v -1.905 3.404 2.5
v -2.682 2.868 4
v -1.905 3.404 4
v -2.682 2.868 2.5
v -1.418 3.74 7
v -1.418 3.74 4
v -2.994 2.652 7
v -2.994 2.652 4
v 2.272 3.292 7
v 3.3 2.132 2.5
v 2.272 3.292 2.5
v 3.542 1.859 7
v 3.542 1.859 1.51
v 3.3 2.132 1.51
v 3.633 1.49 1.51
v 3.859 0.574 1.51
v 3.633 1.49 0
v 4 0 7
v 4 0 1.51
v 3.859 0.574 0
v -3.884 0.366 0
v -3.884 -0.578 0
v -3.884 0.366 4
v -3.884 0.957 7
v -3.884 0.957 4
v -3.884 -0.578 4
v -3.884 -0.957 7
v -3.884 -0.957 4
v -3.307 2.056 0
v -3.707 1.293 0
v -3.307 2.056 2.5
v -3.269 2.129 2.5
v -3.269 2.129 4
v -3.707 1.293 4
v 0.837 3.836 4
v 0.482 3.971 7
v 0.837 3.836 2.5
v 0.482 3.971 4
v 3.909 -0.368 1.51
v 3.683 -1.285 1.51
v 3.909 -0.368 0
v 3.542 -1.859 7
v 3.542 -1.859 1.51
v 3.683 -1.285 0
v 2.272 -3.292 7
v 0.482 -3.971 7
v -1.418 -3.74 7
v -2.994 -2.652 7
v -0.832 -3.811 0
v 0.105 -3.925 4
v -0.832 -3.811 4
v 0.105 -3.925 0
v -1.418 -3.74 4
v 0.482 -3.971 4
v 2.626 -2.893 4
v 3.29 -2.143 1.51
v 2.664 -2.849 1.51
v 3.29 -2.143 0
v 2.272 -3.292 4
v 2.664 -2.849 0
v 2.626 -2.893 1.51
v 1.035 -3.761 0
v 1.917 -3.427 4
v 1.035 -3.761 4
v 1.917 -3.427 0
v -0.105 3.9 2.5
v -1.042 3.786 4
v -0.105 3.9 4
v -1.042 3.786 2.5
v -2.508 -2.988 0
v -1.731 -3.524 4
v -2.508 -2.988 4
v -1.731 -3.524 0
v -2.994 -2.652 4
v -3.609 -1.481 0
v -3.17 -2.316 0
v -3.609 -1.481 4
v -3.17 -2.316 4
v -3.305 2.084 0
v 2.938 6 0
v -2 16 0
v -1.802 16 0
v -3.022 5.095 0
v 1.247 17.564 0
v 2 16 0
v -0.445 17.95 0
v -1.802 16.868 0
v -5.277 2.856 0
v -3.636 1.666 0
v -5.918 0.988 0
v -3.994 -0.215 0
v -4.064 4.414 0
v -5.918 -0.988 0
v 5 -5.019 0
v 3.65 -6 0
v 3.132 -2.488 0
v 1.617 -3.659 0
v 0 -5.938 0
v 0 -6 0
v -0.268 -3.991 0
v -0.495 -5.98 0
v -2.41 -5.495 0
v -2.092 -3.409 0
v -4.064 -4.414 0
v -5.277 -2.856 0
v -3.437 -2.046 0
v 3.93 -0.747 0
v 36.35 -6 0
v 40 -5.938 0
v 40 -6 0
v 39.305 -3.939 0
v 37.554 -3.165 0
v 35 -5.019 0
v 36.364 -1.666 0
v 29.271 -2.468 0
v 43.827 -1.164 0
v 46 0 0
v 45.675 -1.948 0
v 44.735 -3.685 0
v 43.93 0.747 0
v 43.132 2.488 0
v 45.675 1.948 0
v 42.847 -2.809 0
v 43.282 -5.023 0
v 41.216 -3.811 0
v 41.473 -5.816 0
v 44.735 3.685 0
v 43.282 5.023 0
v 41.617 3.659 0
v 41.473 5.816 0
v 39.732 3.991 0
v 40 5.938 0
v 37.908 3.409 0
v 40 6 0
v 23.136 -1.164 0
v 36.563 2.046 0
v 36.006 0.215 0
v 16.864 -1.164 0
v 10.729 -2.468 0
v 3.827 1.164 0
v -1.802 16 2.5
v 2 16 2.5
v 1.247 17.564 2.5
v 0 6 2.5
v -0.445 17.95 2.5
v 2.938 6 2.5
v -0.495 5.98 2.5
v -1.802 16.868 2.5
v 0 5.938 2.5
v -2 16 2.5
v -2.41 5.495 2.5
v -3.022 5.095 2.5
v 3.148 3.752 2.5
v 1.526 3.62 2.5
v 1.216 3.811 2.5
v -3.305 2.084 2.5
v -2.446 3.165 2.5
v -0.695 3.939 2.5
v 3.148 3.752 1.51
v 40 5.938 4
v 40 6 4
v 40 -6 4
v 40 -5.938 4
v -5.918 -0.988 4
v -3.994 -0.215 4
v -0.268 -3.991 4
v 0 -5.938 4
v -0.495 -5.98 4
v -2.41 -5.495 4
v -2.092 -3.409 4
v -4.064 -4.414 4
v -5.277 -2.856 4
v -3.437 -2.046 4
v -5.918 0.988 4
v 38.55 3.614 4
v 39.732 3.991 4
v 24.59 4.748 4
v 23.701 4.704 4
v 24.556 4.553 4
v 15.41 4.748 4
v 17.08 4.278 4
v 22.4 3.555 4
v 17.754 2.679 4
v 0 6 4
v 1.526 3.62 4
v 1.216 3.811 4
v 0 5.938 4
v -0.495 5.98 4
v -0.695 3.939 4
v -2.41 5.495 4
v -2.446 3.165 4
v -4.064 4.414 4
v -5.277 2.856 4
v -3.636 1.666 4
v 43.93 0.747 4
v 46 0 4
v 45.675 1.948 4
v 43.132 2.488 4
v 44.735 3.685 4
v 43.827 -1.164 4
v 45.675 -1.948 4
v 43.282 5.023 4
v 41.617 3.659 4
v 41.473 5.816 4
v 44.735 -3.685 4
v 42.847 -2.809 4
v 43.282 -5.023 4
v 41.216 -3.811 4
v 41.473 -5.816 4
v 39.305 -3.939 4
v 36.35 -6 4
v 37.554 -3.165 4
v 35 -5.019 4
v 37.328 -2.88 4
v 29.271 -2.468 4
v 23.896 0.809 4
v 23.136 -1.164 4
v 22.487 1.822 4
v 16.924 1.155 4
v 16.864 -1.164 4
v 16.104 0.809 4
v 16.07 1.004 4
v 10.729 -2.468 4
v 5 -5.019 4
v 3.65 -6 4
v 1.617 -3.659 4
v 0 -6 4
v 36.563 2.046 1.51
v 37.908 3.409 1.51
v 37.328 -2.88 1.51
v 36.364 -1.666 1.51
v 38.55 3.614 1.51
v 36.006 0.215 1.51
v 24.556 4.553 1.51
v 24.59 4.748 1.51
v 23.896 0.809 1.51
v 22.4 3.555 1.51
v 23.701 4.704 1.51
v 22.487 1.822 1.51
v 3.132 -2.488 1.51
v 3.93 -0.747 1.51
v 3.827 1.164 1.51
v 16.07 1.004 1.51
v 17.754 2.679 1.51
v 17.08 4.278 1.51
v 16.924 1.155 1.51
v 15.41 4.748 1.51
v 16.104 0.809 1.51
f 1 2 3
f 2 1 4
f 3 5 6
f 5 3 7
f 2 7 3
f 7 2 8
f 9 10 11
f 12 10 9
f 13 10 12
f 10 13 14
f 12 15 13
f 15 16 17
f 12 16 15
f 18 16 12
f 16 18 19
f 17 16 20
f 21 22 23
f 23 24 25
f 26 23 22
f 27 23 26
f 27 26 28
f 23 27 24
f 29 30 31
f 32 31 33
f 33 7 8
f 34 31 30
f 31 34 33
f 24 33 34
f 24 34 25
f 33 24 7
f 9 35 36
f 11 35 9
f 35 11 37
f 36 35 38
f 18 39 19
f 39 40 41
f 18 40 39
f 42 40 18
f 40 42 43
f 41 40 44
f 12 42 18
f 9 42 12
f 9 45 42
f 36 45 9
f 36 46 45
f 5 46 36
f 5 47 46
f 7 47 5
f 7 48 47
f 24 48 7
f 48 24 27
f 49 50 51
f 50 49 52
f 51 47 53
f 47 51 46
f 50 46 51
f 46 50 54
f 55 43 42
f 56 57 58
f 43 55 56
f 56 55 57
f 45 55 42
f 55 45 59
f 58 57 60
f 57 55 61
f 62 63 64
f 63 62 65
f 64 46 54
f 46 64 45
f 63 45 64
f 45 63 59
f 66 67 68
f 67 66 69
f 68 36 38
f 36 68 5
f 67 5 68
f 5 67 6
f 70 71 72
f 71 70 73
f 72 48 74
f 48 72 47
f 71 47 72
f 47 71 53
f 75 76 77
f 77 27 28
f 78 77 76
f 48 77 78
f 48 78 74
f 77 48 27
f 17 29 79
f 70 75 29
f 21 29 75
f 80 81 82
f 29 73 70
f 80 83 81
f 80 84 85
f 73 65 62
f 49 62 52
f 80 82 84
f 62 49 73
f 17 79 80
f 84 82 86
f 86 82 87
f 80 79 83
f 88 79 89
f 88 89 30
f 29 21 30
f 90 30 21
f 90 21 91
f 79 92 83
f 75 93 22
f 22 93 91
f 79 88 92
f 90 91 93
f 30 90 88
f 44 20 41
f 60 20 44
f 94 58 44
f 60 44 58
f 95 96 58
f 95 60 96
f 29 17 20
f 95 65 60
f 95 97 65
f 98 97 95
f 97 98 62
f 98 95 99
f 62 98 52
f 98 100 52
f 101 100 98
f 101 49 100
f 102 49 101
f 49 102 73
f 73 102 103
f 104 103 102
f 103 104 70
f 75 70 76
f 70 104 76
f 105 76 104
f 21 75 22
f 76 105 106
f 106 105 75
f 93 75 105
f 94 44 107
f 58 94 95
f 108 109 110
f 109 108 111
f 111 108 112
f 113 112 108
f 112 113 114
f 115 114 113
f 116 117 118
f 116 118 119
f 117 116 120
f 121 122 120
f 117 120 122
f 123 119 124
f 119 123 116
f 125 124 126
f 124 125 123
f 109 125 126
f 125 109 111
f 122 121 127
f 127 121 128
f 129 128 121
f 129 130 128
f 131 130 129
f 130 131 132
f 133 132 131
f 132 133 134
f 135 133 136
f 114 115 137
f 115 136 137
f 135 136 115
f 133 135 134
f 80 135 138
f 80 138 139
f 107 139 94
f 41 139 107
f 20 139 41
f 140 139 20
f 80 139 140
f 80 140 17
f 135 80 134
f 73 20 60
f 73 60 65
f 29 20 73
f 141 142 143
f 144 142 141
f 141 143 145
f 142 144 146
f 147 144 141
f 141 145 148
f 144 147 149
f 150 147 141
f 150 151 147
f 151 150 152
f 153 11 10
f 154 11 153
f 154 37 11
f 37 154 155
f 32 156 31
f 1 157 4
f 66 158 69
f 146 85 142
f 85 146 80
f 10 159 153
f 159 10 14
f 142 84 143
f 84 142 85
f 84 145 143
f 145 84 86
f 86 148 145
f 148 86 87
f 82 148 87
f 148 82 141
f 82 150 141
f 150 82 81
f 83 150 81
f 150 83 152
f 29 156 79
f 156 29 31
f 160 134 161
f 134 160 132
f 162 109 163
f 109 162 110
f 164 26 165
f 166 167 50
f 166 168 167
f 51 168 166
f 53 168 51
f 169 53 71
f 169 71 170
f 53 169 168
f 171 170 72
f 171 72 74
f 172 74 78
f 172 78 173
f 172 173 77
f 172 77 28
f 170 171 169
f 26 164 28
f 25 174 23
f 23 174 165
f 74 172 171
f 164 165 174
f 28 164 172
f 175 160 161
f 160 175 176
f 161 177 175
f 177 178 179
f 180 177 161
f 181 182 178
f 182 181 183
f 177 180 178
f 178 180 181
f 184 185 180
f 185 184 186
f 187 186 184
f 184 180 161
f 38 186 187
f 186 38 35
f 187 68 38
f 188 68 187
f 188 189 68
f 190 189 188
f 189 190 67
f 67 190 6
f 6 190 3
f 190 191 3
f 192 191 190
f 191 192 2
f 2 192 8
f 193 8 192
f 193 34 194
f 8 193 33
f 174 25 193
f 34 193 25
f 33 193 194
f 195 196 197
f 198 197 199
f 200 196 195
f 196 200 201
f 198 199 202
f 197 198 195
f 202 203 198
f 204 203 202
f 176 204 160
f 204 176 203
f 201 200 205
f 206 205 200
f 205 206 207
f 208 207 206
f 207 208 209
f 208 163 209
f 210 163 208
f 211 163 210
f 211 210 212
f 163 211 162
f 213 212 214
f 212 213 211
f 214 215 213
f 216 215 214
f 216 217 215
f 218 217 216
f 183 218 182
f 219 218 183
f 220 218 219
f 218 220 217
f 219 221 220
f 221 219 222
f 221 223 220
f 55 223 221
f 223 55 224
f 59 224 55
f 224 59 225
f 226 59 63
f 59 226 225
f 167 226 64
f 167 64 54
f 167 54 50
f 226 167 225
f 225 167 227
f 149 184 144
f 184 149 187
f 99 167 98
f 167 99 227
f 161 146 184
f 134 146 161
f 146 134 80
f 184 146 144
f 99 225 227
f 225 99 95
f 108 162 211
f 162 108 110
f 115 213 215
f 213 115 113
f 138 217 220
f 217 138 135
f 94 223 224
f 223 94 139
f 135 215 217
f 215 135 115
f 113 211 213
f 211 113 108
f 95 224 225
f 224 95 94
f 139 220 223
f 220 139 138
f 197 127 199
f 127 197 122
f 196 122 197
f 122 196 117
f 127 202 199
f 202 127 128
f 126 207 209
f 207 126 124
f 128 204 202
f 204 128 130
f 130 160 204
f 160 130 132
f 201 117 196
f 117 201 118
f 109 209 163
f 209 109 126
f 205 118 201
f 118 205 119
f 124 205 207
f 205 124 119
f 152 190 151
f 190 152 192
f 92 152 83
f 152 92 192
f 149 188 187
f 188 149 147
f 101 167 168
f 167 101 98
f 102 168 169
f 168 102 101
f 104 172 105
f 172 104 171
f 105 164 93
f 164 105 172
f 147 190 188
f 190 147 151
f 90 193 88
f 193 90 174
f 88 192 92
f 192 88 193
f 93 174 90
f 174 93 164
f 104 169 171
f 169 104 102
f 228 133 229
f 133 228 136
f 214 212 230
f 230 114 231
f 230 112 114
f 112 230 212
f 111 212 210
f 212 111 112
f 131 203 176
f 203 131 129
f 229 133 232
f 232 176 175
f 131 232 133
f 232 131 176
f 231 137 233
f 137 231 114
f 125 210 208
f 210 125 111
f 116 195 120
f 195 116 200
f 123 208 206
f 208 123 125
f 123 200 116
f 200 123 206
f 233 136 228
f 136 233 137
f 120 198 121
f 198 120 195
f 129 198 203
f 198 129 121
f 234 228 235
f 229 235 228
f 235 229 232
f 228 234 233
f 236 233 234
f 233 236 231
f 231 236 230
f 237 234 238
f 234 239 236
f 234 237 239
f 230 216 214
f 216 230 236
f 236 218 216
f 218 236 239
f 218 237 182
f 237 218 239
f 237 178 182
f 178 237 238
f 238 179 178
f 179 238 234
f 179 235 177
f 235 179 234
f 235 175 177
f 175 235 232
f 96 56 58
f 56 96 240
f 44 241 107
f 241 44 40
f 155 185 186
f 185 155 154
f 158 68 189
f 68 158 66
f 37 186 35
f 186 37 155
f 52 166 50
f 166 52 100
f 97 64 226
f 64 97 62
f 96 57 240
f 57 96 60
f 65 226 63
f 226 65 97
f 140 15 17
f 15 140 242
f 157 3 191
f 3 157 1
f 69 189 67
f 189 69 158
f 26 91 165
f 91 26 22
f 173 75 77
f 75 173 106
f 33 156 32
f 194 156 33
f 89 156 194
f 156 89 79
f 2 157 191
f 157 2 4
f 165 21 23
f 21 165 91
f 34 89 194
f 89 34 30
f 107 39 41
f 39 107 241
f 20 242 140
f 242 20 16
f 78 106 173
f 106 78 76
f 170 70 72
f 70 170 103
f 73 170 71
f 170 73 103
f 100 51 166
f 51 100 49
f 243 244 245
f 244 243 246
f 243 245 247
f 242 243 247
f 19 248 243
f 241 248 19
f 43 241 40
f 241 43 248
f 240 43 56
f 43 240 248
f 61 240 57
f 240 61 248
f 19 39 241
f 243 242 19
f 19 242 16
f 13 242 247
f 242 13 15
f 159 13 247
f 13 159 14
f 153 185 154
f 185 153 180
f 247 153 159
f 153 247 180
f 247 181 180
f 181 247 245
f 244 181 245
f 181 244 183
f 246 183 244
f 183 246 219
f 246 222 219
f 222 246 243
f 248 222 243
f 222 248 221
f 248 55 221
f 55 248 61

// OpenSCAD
// file: servo_arm.scad
module
servo_arm(body_r = 8 / 2,
          arm_r1 = 7 / 2,
          arm_r2 = 4 / 2,
          arm_len = 16,
          arm_t = 2.5,
          body_t = 7)
{
    cylinder(r = body_r, h = body_t);

    linear_extrude(height = arm_t)
    {
        circle(r = arm_r1);
        translate([ 0, arm_len, 0 ]) circle(r = arm_r2);
        polygon(points = [
            [ -arm_r1, 0 ],
            [ arm_r1, 0 ],
            [ arm_r2, arm_len ],
            [ -arm_r2, arm_len ]
        ]);
    }
}

servo_arm();
// main file
// alternate femur

include <servo_arm.scad>

module
body(thickness, center_to_center, width)
{
    difference()
    {
        translate([ 0, 0, thickness / 2 ]) union()
        {
            difference()
            {
                cube([ center_to_center, width, thickness ], center = true);
                translate([ 0, -31, -.1 ])
                    cylinder(r = 30, h = thickness + .3, center = true);
            }
            for (x = [ +center_to_center / 2, -center_to_center / 2 ])
                translate([ x, 0, 0 ])
                    cylinder(r = width / 2, h = thickness, center = true);
        }
    }
}

module
femur(thickness = 4, center_to_center = 40, width = 12)
{
    translate([ center_to_center / 2, 0, 0 ]) difference()
    {
        body(thickness, center_to_center, width);
        color("red") translate([ center_to_center / 2, 0, thickness + 0.01 ])
            rotate([ 0, 180, 80 ]) servo_arm();
        color("red") translate([ -center_to_center / 2, 0, thickness + 0.01 ])
            rotate([ 0, 180, -80 ]) servo_arm();
    }
}

femur();
